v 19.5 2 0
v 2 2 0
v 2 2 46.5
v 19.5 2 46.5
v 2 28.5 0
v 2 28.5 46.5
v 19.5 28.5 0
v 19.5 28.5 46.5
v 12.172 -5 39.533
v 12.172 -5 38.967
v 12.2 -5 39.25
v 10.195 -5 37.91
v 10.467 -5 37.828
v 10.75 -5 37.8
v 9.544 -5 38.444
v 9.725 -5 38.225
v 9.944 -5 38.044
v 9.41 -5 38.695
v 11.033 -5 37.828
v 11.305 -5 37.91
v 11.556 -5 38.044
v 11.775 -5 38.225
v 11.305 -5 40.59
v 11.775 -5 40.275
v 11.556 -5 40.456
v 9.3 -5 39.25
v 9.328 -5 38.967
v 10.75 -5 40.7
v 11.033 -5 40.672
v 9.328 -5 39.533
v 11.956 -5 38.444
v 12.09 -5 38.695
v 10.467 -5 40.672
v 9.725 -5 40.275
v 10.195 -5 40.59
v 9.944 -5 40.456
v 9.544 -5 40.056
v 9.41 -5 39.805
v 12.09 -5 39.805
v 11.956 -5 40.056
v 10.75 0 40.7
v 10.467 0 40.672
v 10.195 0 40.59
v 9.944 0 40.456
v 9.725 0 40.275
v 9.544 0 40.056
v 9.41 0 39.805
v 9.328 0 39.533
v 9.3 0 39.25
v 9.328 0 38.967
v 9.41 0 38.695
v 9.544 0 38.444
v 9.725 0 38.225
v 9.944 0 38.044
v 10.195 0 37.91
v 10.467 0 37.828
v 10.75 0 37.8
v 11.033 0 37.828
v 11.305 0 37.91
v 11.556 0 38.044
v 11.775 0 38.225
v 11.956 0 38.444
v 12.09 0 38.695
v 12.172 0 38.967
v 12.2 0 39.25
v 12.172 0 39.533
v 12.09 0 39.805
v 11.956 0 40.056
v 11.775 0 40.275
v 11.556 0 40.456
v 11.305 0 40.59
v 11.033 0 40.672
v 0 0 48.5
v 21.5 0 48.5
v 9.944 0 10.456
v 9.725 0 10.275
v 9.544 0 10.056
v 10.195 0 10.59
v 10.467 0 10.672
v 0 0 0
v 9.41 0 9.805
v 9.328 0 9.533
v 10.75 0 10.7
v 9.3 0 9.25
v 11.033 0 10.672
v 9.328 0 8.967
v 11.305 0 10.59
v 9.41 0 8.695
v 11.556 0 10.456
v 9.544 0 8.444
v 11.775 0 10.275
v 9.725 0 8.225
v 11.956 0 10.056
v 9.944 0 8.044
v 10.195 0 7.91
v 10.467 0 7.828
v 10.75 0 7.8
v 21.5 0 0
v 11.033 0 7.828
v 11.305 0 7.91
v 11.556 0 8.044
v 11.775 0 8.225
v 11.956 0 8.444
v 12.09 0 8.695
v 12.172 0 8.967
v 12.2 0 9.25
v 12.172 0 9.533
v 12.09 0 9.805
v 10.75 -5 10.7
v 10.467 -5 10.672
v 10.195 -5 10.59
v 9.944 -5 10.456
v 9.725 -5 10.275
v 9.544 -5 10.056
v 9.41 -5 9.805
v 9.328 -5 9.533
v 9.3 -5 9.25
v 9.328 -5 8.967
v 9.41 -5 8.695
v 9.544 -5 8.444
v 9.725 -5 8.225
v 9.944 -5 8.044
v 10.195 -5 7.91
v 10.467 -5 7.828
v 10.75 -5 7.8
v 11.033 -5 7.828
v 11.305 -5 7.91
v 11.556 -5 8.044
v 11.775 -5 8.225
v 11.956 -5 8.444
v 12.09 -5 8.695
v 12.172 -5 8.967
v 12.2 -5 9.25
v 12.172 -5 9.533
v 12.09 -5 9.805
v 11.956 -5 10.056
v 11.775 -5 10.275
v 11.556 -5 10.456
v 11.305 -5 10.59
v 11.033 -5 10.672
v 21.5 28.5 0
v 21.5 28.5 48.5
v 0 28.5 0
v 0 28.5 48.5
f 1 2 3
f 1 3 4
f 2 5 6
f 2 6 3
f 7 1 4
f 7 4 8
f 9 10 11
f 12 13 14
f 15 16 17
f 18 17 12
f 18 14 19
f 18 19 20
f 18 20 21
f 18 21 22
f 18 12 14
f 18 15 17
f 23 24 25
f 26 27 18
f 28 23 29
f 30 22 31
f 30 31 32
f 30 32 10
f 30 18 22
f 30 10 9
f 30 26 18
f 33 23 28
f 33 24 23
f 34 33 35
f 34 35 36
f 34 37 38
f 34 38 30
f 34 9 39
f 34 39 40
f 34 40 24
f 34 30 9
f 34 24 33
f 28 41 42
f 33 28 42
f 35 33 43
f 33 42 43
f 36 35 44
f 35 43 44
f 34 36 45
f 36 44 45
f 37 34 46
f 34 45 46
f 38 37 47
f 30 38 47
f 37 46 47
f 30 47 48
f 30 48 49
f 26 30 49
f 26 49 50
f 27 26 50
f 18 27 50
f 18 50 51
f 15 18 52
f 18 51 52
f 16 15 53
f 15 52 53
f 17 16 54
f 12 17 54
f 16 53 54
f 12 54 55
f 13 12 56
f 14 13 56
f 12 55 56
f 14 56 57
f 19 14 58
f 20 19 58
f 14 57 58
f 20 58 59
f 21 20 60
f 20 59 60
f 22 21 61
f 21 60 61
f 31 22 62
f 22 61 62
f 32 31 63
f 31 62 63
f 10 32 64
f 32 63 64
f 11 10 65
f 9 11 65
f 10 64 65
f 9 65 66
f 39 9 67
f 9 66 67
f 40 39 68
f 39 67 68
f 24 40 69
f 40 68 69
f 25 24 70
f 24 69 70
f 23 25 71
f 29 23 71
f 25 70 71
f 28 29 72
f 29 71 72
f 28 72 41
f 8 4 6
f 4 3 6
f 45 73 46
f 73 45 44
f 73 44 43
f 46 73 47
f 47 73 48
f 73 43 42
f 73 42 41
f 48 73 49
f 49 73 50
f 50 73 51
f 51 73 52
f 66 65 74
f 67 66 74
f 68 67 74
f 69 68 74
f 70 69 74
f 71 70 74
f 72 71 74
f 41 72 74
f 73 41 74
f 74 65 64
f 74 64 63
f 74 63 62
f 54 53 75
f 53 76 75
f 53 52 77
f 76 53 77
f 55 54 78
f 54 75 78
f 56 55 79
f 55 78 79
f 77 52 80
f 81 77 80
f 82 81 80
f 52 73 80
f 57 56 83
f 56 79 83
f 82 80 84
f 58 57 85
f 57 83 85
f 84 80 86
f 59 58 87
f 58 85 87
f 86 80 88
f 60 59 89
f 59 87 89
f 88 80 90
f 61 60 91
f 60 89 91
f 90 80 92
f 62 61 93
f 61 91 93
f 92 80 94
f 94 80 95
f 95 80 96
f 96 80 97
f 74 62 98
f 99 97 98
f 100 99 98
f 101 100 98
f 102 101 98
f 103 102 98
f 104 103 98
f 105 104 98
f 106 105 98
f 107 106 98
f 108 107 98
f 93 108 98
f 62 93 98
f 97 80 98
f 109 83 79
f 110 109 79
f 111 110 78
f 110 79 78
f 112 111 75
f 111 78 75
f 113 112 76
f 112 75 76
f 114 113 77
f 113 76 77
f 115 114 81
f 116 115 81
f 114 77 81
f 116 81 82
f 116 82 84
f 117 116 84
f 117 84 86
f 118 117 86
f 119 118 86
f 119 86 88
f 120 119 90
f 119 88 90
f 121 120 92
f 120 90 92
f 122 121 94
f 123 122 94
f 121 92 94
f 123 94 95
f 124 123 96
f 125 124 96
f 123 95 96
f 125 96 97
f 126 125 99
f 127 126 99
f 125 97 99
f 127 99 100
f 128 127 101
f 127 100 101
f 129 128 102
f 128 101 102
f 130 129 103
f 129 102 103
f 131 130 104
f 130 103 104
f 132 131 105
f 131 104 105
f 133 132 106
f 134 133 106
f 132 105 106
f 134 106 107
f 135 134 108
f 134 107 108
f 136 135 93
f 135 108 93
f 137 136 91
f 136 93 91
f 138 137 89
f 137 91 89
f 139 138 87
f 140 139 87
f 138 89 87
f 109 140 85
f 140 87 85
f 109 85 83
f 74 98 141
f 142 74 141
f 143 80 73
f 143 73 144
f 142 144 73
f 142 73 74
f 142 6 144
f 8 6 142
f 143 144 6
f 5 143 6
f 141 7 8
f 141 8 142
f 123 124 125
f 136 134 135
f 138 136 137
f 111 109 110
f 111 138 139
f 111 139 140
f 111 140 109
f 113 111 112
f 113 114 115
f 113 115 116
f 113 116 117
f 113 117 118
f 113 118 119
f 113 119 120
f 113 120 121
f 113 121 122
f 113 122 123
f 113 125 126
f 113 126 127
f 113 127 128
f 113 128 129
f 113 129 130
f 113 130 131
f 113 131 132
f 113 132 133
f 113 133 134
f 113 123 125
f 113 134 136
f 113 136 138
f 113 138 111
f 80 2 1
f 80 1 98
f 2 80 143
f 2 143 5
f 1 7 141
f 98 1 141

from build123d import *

# Parameters (mm, degrees)
SKETCH2_W           = 21.5
SKETCH2_H           = 28.5
BOSS_EXTRUDE6_DEPTH = 48.5
CUT_EXTRUDE5_DEPTH  = 46.5
SKETCH5_R           = 1.45
BOSS_EXTRUDE7_DEPTH = 5


with BuildPart() as part:
    # Sketch2 → Boss-Extrude6 (new body)
    with BuildSketch(Plane.XY):
        with Locations((10.75, 14.25)):
            Rectangle(SKETCH2_W, SKETCH2_H)
    extrude(amount=BOSS_EXTRUDE6_DEPTH)

    # 3DSketch6 → Cut-Extrude5 (cut)
    with BuildSketch(Plane(origin=(19.5, 2, 0), x_dir=(-0.5510615347417098, 0.8344646097517326, 0), z_dir=(0, 0, 1))):
        Polygon((0, 0), (22.113312158, -14.603130671), (31.756889016, 0), (9.643576858, 14.603130671), align=None)
    extrude(amount=CUT_EXTRUDE5_DEPTH, mode=Mode.SUBTRACT)

    # Sketch5 → Boss-Extrude7 (add)
    with BuildSketch(Plane(origin=(0, 0, 0), x_dir=(-1, 0, 0), z_dir=(0, -1, 0))):
        with Locations(Location((-10.75, -39.25, 0), (0, 0, 270))):
            Circle(SKETCH5_R)
        with Locations(Location((-10.75, -9.25, 0), (0, 0, 270))):
            Circle(SKETCH5_R)
    extrude(amount=BOSS_EXTRUDE7_DEPTH)


solid = part.part
